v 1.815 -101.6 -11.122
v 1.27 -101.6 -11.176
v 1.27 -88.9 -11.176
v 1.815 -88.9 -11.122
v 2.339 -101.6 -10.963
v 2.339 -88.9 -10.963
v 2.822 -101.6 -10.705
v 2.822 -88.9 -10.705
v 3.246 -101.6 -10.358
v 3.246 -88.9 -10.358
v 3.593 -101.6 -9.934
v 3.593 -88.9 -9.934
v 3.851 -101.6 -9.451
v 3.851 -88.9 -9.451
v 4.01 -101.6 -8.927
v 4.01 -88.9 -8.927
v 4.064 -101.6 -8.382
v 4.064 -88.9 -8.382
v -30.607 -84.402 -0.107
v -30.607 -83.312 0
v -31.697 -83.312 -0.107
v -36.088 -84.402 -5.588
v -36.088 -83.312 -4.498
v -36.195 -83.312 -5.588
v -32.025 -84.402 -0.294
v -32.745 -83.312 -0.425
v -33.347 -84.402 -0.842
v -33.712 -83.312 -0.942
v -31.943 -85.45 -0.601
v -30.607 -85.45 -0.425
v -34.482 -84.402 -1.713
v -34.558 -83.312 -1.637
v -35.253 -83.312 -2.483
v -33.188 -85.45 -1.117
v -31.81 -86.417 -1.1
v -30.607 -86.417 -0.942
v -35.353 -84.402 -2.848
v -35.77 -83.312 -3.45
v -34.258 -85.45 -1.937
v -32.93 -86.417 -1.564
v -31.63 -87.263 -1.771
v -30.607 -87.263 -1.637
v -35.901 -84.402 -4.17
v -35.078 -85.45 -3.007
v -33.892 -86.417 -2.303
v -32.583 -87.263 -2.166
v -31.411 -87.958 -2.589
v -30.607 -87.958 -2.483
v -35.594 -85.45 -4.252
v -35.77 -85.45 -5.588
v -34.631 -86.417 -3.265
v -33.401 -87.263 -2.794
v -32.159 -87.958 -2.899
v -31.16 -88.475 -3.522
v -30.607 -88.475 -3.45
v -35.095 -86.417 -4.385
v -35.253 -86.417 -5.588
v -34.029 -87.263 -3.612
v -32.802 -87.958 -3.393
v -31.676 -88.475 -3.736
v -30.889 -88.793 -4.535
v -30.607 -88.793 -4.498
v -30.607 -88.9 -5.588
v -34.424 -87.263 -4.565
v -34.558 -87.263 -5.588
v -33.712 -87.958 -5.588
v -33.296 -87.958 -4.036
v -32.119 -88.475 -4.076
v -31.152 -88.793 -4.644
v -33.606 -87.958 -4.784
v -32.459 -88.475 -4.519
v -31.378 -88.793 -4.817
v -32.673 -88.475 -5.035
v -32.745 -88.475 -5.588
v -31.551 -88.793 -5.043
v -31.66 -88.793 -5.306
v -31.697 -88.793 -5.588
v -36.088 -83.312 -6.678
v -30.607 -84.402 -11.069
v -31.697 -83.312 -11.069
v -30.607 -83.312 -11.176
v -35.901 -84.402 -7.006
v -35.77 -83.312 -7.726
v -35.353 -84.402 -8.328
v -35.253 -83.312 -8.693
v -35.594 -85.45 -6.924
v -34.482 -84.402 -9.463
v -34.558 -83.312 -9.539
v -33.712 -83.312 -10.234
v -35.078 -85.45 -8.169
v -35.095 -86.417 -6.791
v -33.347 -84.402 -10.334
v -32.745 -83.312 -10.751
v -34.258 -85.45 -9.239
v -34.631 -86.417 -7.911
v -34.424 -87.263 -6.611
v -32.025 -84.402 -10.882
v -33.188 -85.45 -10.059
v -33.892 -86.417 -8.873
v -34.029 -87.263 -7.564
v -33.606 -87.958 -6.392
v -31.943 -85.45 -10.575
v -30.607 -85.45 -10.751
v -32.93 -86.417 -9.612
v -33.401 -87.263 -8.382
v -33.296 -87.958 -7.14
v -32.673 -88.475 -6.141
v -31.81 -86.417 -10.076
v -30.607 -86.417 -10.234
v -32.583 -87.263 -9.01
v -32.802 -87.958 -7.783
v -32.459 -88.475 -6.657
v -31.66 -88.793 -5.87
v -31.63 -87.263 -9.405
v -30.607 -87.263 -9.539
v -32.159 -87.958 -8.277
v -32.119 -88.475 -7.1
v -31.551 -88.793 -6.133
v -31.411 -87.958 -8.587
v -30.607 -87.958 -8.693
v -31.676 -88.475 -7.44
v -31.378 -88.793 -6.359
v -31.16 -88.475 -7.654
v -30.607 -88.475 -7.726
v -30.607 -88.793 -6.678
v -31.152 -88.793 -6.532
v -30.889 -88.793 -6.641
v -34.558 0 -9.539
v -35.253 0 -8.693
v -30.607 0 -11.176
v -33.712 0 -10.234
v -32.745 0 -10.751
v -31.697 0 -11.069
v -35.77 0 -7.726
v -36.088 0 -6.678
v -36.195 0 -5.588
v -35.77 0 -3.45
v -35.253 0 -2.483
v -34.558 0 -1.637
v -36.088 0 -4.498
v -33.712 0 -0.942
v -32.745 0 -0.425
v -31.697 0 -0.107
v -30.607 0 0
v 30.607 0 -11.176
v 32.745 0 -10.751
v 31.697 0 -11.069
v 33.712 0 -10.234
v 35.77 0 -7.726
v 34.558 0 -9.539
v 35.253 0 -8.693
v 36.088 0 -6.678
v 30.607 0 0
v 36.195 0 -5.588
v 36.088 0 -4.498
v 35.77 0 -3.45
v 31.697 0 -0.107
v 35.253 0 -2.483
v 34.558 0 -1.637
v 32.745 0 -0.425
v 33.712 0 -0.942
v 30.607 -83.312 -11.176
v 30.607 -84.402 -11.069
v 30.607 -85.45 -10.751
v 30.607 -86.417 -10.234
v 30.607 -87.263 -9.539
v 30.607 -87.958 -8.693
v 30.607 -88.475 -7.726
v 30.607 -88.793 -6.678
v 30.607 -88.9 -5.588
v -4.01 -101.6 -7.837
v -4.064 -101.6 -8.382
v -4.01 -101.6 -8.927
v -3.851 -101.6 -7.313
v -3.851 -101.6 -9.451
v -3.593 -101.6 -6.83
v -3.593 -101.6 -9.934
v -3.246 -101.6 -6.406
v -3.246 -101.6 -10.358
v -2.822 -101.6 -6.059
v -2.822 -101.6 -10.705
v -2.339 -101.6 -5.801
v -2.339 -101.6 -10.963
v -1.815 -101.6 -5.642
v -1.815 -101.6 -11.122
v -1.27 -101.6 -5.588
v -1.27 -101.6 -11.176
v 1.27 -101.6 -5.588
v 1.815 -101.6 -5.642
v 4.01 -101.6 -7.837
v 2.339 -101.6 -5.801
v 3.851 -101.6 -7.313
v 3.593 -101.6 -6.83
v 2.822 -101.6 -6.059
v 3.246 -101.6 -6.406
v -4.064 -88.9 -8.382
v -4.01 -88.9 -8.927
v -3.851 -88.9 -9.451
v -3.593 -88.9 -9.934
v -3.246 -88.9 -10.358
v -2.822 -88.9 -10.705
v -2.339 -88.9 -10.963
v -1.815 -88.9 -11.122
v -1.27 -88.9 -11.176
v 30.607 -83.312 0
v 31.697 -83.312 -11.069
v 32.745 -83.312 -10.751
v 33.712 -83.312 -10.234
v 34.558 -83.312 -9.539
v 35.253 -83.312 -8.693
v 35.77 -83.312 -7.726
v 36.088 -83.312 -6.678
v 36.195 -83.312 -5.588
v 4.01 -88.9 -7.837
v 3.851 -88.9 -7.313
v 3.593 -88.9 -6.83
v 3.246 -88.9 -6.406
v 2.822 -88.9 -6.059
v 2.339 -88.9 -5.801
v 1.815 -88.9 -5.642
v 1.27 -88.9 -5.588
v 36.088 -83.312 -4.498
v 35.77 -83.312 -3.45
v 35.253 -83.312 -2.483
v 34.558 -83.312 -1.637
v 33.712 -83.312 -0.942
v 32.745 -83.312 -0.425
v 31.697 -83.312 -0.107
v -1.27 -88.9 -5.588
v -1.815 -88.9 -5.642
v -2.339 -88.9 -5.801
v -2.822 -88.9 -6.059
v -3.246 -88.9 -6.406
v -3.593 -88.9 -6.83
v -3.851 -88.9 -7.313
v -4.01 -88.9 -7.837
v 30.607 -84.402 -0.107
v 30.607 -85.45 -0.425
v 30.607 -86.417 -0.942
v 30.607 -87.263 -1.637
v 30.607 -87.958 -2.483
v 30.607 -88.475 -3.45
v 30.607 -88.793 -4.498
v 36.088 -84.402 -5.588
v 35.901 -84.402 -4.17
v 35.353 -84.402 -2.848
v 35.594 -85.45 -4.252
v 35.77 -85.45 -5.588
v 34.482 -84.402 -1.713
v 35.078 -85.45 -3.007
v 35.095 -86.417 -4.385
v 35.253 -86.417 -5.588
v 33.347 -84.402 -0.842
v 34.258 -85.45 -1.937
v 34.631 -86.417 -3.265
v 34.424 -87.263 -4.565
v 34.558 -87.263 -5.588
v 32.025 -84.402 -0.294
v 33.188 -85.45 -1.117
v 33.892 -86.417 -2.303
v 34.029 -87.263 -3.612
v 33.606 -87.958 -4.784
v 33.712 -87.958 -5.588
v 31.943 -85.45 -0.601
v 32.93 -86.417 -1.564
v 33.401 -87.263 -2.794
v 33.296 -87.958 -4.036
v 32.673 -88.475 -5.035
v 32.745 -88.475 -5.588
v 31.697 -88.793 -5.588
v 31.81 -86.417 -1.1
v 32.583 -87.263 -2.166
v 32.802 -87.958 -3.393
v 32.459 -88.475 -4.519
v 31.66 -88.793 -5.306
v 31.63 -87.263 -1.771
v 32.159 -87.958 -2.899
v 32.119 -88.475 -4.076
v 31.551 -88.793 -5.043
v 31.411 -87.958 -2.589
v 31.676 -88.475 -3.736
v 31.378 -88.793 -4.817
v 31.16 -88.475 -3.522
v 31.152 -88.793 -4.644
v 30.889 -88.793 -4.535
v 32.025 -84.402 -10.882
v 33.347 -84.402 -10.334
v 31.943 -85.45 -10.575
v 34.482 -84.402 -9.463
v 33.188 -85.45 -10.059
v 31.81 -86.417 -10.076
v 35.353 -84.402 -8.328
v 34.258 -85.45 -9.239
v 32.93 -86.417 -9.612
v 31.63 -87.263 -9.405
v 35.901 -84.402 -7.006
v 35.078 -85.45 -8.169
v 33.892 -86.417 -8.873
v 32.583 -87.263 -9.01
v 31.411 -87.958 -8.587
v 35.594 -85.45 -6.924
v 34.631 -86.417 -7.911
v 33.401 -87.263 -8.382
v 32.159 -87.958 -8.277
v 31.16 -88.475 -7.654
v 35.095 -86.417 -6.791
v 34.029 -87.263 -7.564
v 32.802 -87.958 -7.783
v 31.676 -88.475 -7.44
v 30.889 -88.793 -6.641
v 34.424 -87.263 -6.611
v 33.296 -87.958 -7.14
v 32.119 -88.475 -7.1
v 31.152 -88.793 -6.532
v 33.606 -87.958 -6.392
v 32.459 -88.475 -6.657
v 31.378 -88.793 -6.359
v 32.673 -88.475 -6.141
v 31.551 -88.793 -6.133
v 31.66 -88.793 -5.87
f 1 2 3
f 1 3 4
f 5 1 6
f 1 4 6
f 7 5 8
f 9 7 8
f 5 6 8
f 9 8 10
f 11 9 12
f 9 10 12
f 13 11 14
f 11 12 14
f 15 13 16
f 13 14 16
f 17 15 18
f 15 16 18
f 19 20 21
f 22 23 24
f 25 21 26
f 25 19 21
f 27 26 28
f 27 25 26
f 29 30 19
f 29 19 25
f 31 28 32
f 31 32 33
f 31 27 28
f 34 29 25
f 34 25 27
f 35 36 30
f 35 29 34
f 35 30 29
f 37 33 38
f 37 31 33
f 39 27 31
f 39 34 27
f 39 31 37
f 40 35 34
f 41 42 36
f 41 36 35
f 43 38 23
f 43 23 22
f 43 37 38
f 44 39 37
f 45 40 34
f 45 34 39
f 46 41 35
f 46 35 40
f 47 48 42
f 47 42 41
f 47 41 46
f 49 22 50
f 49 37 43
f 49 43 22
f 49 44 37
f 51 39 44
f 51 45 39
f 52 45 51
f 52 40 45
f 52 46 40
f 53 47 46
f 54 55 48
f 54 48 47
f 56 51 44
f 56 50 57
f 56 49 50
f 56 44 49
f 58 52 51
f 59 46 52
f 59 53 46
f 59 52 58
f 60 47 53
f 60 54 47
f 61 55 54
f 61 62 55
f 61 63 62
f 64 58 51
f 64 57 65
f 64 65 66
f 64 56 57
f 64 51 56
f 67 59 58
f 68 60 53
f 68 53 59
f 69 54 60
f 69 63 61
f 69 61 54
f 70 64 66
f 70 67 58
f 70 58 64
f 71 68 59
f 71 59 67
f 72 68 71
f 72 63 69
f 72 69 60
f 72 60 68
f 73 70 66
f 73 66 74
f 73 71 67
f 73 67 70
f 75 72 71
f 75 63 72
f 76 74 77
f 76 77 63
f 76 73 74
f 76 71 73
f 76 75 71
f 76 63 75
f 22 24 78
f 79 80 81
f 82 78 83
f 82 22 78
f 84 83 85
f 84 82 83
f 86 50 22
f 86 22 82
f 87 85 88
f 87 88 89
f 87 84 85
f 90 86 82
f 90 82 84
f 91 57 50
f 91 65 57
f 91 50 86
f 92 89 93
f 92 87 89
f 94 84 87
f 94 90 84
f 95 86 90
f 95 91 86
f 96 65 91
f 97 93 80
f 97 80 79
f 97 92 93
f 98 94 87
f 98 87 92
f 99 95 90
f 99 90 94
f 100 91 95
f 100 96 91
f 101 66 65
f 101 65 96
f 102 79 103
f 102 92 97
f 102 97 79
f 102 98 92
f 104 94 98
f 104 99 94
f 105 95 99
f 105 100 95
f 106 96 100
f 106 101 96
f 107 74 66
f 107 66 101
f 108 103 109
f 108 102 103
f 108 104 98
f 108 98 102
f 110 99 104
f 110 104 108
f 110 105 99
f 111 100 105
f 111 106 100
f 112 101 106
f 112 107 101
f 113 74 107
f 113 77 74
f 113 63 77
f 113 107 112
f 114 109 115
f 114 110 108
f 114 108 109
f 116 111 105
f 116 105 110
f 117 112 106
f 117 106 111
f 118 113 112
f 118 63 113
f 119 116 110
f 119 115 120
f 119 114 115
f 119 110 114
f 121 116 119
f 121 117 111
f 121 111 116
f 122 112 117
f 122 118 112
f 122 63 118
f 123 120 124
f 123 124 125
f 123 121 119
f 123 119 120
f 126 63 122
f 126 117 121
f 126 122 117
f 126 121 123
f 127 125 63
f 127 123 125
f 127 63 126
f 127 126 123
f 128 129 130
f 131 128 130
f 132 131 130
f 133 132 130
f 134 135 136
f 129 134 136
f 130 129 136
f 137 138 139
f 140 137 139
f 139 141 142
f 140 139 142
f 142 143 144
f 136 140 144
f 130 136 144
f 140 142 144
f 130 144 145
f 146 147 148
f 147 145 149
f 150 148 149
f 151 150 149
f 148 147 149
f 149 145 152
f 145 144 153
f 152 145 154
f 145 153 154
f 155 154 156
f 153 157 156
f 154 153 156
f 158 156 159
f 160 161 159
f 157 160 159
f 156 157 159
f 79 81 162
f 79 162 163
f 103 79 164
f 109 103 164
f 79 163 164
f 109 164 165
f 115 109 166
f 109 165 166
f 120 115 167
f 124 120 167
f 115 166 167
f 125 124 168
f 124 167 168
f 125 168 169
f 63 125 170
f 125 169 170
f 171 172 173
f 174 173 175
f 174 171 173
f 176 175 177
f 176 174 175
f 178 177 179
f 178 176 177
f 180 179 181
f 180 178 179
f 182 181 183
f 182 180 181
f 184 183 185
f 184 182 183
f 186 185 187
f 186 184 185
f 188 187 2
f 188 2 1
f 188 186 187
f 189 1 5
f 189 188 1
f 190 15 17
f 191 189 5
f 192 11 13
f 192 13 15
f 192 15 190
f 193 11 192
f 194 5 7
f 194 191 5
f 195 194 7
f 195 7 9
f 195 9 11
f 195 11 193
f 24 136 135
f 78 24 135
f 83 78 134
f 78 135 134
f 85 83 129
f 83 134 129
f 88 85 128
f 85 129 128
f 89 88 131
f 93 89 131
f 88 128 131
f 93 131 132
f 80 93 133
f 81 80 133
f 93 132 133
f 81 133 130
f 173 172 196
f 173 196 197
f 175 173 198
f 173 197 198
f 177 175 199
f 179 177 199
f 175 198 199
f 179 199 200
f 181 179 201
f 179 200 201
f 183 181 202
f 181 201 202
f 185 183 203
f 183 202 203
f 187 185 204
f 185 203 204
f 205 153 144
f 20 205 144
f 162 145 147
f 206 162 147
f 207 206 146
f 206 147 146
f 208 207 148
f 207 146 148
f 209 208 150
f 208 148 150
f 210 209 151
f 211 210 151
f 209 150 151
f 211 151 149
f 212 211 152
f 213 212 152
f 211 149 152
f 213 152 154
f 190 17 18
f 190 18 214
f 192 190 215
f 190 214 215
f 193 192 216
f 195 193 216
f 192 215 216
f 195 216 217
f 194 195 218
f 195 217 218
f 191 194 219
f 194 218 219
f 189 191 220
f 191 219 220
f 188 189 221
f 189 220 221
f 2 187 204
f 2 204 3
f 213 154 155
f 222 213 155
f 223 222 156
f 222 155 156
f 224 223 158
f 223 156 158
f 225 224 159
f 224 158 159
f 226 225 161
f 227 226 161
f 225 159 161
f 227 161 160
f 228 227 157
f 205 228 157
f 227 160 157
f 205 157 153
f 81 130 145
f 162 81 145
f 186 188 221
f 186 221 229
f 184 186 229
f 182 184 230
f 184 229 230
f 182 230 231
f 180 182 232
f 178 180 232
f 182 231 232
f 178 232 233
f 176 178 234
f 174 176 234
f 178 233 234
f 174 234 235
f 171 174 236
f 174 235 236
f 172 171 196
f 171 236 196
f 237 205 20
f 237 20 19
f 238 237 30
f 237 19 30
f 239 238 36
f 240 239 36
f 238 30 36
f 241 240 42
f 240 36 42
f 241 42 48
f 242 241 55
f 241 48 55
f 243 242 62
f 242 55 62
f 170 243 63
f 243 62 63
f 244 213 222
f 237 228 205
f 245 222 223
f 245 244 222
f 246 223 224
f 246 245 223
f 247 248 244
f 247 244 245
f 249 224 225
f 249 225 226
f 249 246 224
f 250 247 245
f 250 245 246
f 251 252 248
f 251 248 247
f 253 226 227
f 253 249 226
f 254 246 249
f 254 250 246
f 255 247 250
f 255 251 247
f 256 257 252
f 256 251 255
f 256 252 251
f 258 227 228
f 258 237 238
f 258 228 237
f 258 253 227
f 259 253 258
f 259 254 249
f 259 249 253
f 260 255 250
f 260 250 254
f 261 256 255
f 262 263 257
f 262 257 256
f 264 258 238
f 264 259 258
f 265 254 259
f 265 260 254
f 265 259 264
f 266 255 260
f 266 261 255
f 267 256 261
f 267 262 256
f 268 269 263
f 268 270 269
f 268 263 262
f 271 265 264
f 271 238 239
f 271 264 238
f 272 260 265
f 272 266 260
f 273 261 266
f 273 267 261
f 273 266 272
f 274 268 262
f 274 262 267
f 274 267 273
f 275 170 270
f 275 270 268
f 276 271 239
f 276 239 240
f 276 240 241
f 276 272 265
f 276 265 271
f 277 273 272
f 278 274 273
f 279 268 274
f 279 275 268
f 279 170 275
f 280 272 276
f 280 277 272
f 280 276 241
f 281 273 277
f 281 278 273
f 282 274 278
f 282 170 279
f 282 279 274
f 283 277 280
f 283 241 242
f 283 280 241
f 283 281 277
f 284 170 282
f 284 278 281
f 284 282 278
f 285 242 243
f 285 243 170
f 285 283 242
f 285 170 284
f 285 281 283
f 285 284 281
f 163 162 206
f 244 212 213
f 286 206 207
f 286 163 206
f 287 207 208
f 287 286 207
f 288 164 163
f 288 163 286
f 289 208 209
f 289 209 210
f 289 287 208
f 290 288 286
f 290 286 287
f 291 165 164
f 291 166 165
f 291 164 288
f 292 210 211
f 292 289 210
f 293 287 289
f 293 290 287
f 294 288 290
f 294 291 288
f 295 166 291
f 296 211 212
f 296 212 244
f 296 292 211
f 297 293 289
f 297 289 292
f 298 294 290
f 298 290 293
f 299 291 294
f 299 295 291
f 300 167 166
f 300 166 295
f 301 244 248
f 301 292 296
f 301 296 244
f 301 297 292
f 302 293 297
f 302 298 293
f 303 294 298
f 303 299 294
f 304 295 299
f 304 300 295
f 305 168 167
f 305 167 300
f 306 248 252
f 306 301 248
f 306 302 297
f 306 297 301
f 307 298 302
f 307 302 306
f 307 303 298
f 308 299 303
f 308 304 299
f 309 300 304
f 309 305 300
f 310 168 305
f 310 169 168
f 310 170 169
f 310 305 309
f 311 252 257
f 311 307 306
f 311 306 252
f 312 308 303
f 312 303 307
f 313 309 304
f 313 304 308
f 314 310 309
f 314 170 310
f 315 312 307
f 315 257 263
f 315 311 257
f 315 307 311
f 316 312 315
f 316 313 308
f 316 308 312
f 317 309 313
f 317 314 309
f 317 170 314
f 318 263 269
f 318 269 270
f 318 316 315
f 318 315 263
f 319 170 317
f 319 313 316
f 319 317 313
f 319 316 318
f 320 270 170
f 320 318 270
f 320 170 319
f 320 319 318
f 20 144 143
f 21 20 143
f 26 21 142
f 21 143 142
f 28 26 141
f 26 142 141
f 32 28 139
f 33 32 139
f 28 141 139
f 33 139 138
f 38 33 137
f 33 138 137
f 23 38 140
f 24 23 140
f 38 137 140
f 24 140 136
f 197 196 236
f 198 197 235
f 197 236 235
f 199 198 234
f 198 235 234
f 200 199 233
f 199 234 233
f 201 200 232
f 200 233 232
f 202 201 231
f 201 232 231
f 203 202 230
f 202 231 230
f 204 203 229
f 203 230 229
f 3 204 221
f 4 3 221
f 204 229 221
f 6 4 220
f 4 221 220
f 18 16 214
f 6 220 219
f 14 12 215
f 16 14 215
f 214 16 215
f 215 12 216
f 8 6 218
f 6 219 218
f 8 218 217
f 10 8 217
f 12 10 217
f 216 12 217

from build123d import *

# Parameters (mm, degrees)
F1_DEPTH = 88.9
F3_R     = 5.58799
F4_DEPTH = 12.7


# Not quite as in the source:
# - a fillet or chamfer is up to 0.001 mm smaller than in the source, because OpenCascade refuses the exact size


with BuildPart() as f1:
    # F0 (on Front) → F1 (new body)
    with BuildSketch(Plane.XZ):
        with BuildLine():
            ThreePointArc((-25.019, -5.588), (-26.6556873013, -1.6366873121), (-30.6069999848, 0))
            ThreePointArc((-30.6069999848, 0), (-34.5583126879, -1.6366873013), (-36.195, -5.588))
            ThreePointArc((-36.195, -5.588), (-34.5583126933, -9.5393126933), (-30.607, -11.176))
            ThreePointArc((-30.607, -11.176), (-26.6556873067, -9.5393126933), (-25.019, -5.588))
        make_face()
        with BuildLine():
            Line((0, -11.176), (0, 0))
            Line((0, 0), (-30.6069999848, 0))
            ThreePointArc((-30.6069999848, 0), (-26.6556873013, -1.6366873121), (-25.019, -5.588))
            ThreePointArc((-25.019, -5.588), (-26.6556873067, -9.5393126933), (-30.607, -11.176))
            Line((-30.607, -11.176), (0, -11.176))
        make_face()
        with BuildLine():
            Line((30.607, 0), (0, 0))
            Line((0, 0), (0, -11.176))
            Line((0, -11.176), (30.607, -11.176))
            ThreePointArc((30.607, -11.176), (25.019, -5.588), (30.607, 0))
        make_face()
        with BuildLine():
            ThreePointArc((36.195, -5.588), (34.5583126933, -1.6366873067), (30.607, 0))
            ThreePointArc((30.607, 0), (25.019, -5.588), (30.607, -11.176))
            ThreePointArc((30.607, -11.176), (34.5583126933, -9.5393126933), (36.195, -5.588))
        make_face()
    extrude(amount=F1_DEPTH)

    # F3 (radius 5.588 in the source; OpenCascade refuses exactly that, so slightly less here)
    f3_edges = [f1.edges().sort_by_distance(p)[0] for p in [
        (0, -88.9, 0),
        (-36.195, -88.9, -5.588),
        (36.195, -88.9, -5.588),
    ]]
    fillet(f3_edges, radius=F3_R)


with BuildPart() as f4:
    # F2 (on face) → F4 (new body)
    with BuildSketch(Plane.XZ.offset(88.9)):
        with BuildLine():
            ThreePointArc((0, -5.8933184213), (-0.6169074839, -5.6654017291), (-1.27, -5.588))
            ThreePointArc((-1.27, -5.588), (-3.2456563466, -6.4063436534), (-4.064, -8.382))
            Line((-4.064, -8.382), (-1.524, -8.382))
            ThreePointArc((-1.524, -8.382), (-1.112731206, -6.9228810878), (0, -5.8933184213))
        make_face()
        with BuildLine():
            Line((0, -5.588), (-1.27, -5.588))
            ThreePointArc((-1.27, -5.588), (-0.6169074839, -5.6654017291), (0, -5.8933184213))
            Line((0, -5.8933184213), (0, -5.588))
        make_face()
        with BuildLine():
            Line((1.27, -5.588), (0, -5.588))
            Line((0, -5.588), (0, -5.8933184213))
            ThreePointArc((0, -5.8933184213), (0.6169074839, -5.6654017291), (1.27, -5.588))
        make_face()
        with BuildLine():
            Line((-1.524, -8.382), (-4.064, -8.382))
            ThreePointArc((-4.064, -8.382), (-3.2456563466, -10.3576563466), (-1.27, -11.176))
            ThreePointArc((-1.27, -11.176), (-0.6169074839, -11.0985982709), (0, -10.8706815787))
            ThreePointArc((0, -10.8706815787), (-1.112731206, -9.8411189122), (-1.524, -8.382))
        make_face()
        with BuildLine():
            ThreePointArc((1.524, -8.382), (1.112731206, -6.9228810878), (0, -5.8933184213))
            Line((0, -5.8933184213), (0, -8.382))
            Line((0, -8.382), (1.27, -8.382))
            Line((1.27, -8.382), (1.524, -8.382))
        make_face()
        with BuildLine():
            ThreePointArc((1.27, -5.588), (0.6169074839, -5.6654017291), (0, -5.8933184213))
            ThreePointArc((0, -5.8933184213), (1.112731206, -6.9228810878), (1.524, -8.382))
            Line((1.524, -8.382), (4.064, -8.382))
            ThreePointArc((4.064, -8.382), (3.2456563466, -6.4063436534), (1.27, -5.588))
        make_face()
        with BuildLine():
            Line((0, -8.382), (0, -5.8933184213))
            ThreePointArc((0, -5.8933184213), (-1.112731206, -6.9228810878), (-1.524, -8.382))
            Line((-1.524, -8.382), (-1.27, -8.382))
            Line((-1.27, -8.382), (0, -8.382))
        make_face()
        with BuildLine():
            ThreePointArc((0, -10.8706815787), (-0.6169074839, -11.0985982709), (-1.27, -11.176))
            Line((-1.27, -11.176), (0, -11.176))
            Line((0, -11.176), (0, -10.8706815787))
        make_face()
        with BuildLine():
            Line((-1.27, -8.382), (-1.524, -8.382))
            ThreePointArc((-1.524, -8.382), (-1.112731206, -9.8411189122), (0, -10.8706815787))
            Line((0, -10.8706815787), (0, -8.382))
            Line((0, -8.382), (-1.27, -8.382))
        make_face()
        with BuildLine():
            Line((1.27, -8.382), (0, -8.382))
            Line((0, -8.382), (0, -10.8706815787))
            ThreePointArc((0, -10.8706815787), (1.112731206, -9.8411189122), (1.524, -8.382))
            Line((1.524, -8.382), (1.27, -8.382))
        make_face()
        with BuildLine():
            Line((4.064, -8.382), (1.524, -8.382))
            ThreePointArc((1.524, -8.382), (1.112731206, -9.8411189122), (0, -10.8706815787))
            ThreePointArc((0, -10.8706815787), (0.6169074839, -11.0985982709), (1.27, -11.176))
            ThreePointArc((1.27, -11.176), (3.2456563466, -10.3576563466), (4.064, -8.382))
        make_face()
        with BuildLine():
            ThreePointArc((1.27, -11.176), (0.6169074839, -11.0985982709), (0, -10.8706815787))
            Line((0, -10.8706815787), (0, -11.176))
            Line((0, -11.176), (1.27, -11.176))
        make_face()
    extrude(amount=F4_DEPTH)


solid = Compound([f1.part, f4.part])
